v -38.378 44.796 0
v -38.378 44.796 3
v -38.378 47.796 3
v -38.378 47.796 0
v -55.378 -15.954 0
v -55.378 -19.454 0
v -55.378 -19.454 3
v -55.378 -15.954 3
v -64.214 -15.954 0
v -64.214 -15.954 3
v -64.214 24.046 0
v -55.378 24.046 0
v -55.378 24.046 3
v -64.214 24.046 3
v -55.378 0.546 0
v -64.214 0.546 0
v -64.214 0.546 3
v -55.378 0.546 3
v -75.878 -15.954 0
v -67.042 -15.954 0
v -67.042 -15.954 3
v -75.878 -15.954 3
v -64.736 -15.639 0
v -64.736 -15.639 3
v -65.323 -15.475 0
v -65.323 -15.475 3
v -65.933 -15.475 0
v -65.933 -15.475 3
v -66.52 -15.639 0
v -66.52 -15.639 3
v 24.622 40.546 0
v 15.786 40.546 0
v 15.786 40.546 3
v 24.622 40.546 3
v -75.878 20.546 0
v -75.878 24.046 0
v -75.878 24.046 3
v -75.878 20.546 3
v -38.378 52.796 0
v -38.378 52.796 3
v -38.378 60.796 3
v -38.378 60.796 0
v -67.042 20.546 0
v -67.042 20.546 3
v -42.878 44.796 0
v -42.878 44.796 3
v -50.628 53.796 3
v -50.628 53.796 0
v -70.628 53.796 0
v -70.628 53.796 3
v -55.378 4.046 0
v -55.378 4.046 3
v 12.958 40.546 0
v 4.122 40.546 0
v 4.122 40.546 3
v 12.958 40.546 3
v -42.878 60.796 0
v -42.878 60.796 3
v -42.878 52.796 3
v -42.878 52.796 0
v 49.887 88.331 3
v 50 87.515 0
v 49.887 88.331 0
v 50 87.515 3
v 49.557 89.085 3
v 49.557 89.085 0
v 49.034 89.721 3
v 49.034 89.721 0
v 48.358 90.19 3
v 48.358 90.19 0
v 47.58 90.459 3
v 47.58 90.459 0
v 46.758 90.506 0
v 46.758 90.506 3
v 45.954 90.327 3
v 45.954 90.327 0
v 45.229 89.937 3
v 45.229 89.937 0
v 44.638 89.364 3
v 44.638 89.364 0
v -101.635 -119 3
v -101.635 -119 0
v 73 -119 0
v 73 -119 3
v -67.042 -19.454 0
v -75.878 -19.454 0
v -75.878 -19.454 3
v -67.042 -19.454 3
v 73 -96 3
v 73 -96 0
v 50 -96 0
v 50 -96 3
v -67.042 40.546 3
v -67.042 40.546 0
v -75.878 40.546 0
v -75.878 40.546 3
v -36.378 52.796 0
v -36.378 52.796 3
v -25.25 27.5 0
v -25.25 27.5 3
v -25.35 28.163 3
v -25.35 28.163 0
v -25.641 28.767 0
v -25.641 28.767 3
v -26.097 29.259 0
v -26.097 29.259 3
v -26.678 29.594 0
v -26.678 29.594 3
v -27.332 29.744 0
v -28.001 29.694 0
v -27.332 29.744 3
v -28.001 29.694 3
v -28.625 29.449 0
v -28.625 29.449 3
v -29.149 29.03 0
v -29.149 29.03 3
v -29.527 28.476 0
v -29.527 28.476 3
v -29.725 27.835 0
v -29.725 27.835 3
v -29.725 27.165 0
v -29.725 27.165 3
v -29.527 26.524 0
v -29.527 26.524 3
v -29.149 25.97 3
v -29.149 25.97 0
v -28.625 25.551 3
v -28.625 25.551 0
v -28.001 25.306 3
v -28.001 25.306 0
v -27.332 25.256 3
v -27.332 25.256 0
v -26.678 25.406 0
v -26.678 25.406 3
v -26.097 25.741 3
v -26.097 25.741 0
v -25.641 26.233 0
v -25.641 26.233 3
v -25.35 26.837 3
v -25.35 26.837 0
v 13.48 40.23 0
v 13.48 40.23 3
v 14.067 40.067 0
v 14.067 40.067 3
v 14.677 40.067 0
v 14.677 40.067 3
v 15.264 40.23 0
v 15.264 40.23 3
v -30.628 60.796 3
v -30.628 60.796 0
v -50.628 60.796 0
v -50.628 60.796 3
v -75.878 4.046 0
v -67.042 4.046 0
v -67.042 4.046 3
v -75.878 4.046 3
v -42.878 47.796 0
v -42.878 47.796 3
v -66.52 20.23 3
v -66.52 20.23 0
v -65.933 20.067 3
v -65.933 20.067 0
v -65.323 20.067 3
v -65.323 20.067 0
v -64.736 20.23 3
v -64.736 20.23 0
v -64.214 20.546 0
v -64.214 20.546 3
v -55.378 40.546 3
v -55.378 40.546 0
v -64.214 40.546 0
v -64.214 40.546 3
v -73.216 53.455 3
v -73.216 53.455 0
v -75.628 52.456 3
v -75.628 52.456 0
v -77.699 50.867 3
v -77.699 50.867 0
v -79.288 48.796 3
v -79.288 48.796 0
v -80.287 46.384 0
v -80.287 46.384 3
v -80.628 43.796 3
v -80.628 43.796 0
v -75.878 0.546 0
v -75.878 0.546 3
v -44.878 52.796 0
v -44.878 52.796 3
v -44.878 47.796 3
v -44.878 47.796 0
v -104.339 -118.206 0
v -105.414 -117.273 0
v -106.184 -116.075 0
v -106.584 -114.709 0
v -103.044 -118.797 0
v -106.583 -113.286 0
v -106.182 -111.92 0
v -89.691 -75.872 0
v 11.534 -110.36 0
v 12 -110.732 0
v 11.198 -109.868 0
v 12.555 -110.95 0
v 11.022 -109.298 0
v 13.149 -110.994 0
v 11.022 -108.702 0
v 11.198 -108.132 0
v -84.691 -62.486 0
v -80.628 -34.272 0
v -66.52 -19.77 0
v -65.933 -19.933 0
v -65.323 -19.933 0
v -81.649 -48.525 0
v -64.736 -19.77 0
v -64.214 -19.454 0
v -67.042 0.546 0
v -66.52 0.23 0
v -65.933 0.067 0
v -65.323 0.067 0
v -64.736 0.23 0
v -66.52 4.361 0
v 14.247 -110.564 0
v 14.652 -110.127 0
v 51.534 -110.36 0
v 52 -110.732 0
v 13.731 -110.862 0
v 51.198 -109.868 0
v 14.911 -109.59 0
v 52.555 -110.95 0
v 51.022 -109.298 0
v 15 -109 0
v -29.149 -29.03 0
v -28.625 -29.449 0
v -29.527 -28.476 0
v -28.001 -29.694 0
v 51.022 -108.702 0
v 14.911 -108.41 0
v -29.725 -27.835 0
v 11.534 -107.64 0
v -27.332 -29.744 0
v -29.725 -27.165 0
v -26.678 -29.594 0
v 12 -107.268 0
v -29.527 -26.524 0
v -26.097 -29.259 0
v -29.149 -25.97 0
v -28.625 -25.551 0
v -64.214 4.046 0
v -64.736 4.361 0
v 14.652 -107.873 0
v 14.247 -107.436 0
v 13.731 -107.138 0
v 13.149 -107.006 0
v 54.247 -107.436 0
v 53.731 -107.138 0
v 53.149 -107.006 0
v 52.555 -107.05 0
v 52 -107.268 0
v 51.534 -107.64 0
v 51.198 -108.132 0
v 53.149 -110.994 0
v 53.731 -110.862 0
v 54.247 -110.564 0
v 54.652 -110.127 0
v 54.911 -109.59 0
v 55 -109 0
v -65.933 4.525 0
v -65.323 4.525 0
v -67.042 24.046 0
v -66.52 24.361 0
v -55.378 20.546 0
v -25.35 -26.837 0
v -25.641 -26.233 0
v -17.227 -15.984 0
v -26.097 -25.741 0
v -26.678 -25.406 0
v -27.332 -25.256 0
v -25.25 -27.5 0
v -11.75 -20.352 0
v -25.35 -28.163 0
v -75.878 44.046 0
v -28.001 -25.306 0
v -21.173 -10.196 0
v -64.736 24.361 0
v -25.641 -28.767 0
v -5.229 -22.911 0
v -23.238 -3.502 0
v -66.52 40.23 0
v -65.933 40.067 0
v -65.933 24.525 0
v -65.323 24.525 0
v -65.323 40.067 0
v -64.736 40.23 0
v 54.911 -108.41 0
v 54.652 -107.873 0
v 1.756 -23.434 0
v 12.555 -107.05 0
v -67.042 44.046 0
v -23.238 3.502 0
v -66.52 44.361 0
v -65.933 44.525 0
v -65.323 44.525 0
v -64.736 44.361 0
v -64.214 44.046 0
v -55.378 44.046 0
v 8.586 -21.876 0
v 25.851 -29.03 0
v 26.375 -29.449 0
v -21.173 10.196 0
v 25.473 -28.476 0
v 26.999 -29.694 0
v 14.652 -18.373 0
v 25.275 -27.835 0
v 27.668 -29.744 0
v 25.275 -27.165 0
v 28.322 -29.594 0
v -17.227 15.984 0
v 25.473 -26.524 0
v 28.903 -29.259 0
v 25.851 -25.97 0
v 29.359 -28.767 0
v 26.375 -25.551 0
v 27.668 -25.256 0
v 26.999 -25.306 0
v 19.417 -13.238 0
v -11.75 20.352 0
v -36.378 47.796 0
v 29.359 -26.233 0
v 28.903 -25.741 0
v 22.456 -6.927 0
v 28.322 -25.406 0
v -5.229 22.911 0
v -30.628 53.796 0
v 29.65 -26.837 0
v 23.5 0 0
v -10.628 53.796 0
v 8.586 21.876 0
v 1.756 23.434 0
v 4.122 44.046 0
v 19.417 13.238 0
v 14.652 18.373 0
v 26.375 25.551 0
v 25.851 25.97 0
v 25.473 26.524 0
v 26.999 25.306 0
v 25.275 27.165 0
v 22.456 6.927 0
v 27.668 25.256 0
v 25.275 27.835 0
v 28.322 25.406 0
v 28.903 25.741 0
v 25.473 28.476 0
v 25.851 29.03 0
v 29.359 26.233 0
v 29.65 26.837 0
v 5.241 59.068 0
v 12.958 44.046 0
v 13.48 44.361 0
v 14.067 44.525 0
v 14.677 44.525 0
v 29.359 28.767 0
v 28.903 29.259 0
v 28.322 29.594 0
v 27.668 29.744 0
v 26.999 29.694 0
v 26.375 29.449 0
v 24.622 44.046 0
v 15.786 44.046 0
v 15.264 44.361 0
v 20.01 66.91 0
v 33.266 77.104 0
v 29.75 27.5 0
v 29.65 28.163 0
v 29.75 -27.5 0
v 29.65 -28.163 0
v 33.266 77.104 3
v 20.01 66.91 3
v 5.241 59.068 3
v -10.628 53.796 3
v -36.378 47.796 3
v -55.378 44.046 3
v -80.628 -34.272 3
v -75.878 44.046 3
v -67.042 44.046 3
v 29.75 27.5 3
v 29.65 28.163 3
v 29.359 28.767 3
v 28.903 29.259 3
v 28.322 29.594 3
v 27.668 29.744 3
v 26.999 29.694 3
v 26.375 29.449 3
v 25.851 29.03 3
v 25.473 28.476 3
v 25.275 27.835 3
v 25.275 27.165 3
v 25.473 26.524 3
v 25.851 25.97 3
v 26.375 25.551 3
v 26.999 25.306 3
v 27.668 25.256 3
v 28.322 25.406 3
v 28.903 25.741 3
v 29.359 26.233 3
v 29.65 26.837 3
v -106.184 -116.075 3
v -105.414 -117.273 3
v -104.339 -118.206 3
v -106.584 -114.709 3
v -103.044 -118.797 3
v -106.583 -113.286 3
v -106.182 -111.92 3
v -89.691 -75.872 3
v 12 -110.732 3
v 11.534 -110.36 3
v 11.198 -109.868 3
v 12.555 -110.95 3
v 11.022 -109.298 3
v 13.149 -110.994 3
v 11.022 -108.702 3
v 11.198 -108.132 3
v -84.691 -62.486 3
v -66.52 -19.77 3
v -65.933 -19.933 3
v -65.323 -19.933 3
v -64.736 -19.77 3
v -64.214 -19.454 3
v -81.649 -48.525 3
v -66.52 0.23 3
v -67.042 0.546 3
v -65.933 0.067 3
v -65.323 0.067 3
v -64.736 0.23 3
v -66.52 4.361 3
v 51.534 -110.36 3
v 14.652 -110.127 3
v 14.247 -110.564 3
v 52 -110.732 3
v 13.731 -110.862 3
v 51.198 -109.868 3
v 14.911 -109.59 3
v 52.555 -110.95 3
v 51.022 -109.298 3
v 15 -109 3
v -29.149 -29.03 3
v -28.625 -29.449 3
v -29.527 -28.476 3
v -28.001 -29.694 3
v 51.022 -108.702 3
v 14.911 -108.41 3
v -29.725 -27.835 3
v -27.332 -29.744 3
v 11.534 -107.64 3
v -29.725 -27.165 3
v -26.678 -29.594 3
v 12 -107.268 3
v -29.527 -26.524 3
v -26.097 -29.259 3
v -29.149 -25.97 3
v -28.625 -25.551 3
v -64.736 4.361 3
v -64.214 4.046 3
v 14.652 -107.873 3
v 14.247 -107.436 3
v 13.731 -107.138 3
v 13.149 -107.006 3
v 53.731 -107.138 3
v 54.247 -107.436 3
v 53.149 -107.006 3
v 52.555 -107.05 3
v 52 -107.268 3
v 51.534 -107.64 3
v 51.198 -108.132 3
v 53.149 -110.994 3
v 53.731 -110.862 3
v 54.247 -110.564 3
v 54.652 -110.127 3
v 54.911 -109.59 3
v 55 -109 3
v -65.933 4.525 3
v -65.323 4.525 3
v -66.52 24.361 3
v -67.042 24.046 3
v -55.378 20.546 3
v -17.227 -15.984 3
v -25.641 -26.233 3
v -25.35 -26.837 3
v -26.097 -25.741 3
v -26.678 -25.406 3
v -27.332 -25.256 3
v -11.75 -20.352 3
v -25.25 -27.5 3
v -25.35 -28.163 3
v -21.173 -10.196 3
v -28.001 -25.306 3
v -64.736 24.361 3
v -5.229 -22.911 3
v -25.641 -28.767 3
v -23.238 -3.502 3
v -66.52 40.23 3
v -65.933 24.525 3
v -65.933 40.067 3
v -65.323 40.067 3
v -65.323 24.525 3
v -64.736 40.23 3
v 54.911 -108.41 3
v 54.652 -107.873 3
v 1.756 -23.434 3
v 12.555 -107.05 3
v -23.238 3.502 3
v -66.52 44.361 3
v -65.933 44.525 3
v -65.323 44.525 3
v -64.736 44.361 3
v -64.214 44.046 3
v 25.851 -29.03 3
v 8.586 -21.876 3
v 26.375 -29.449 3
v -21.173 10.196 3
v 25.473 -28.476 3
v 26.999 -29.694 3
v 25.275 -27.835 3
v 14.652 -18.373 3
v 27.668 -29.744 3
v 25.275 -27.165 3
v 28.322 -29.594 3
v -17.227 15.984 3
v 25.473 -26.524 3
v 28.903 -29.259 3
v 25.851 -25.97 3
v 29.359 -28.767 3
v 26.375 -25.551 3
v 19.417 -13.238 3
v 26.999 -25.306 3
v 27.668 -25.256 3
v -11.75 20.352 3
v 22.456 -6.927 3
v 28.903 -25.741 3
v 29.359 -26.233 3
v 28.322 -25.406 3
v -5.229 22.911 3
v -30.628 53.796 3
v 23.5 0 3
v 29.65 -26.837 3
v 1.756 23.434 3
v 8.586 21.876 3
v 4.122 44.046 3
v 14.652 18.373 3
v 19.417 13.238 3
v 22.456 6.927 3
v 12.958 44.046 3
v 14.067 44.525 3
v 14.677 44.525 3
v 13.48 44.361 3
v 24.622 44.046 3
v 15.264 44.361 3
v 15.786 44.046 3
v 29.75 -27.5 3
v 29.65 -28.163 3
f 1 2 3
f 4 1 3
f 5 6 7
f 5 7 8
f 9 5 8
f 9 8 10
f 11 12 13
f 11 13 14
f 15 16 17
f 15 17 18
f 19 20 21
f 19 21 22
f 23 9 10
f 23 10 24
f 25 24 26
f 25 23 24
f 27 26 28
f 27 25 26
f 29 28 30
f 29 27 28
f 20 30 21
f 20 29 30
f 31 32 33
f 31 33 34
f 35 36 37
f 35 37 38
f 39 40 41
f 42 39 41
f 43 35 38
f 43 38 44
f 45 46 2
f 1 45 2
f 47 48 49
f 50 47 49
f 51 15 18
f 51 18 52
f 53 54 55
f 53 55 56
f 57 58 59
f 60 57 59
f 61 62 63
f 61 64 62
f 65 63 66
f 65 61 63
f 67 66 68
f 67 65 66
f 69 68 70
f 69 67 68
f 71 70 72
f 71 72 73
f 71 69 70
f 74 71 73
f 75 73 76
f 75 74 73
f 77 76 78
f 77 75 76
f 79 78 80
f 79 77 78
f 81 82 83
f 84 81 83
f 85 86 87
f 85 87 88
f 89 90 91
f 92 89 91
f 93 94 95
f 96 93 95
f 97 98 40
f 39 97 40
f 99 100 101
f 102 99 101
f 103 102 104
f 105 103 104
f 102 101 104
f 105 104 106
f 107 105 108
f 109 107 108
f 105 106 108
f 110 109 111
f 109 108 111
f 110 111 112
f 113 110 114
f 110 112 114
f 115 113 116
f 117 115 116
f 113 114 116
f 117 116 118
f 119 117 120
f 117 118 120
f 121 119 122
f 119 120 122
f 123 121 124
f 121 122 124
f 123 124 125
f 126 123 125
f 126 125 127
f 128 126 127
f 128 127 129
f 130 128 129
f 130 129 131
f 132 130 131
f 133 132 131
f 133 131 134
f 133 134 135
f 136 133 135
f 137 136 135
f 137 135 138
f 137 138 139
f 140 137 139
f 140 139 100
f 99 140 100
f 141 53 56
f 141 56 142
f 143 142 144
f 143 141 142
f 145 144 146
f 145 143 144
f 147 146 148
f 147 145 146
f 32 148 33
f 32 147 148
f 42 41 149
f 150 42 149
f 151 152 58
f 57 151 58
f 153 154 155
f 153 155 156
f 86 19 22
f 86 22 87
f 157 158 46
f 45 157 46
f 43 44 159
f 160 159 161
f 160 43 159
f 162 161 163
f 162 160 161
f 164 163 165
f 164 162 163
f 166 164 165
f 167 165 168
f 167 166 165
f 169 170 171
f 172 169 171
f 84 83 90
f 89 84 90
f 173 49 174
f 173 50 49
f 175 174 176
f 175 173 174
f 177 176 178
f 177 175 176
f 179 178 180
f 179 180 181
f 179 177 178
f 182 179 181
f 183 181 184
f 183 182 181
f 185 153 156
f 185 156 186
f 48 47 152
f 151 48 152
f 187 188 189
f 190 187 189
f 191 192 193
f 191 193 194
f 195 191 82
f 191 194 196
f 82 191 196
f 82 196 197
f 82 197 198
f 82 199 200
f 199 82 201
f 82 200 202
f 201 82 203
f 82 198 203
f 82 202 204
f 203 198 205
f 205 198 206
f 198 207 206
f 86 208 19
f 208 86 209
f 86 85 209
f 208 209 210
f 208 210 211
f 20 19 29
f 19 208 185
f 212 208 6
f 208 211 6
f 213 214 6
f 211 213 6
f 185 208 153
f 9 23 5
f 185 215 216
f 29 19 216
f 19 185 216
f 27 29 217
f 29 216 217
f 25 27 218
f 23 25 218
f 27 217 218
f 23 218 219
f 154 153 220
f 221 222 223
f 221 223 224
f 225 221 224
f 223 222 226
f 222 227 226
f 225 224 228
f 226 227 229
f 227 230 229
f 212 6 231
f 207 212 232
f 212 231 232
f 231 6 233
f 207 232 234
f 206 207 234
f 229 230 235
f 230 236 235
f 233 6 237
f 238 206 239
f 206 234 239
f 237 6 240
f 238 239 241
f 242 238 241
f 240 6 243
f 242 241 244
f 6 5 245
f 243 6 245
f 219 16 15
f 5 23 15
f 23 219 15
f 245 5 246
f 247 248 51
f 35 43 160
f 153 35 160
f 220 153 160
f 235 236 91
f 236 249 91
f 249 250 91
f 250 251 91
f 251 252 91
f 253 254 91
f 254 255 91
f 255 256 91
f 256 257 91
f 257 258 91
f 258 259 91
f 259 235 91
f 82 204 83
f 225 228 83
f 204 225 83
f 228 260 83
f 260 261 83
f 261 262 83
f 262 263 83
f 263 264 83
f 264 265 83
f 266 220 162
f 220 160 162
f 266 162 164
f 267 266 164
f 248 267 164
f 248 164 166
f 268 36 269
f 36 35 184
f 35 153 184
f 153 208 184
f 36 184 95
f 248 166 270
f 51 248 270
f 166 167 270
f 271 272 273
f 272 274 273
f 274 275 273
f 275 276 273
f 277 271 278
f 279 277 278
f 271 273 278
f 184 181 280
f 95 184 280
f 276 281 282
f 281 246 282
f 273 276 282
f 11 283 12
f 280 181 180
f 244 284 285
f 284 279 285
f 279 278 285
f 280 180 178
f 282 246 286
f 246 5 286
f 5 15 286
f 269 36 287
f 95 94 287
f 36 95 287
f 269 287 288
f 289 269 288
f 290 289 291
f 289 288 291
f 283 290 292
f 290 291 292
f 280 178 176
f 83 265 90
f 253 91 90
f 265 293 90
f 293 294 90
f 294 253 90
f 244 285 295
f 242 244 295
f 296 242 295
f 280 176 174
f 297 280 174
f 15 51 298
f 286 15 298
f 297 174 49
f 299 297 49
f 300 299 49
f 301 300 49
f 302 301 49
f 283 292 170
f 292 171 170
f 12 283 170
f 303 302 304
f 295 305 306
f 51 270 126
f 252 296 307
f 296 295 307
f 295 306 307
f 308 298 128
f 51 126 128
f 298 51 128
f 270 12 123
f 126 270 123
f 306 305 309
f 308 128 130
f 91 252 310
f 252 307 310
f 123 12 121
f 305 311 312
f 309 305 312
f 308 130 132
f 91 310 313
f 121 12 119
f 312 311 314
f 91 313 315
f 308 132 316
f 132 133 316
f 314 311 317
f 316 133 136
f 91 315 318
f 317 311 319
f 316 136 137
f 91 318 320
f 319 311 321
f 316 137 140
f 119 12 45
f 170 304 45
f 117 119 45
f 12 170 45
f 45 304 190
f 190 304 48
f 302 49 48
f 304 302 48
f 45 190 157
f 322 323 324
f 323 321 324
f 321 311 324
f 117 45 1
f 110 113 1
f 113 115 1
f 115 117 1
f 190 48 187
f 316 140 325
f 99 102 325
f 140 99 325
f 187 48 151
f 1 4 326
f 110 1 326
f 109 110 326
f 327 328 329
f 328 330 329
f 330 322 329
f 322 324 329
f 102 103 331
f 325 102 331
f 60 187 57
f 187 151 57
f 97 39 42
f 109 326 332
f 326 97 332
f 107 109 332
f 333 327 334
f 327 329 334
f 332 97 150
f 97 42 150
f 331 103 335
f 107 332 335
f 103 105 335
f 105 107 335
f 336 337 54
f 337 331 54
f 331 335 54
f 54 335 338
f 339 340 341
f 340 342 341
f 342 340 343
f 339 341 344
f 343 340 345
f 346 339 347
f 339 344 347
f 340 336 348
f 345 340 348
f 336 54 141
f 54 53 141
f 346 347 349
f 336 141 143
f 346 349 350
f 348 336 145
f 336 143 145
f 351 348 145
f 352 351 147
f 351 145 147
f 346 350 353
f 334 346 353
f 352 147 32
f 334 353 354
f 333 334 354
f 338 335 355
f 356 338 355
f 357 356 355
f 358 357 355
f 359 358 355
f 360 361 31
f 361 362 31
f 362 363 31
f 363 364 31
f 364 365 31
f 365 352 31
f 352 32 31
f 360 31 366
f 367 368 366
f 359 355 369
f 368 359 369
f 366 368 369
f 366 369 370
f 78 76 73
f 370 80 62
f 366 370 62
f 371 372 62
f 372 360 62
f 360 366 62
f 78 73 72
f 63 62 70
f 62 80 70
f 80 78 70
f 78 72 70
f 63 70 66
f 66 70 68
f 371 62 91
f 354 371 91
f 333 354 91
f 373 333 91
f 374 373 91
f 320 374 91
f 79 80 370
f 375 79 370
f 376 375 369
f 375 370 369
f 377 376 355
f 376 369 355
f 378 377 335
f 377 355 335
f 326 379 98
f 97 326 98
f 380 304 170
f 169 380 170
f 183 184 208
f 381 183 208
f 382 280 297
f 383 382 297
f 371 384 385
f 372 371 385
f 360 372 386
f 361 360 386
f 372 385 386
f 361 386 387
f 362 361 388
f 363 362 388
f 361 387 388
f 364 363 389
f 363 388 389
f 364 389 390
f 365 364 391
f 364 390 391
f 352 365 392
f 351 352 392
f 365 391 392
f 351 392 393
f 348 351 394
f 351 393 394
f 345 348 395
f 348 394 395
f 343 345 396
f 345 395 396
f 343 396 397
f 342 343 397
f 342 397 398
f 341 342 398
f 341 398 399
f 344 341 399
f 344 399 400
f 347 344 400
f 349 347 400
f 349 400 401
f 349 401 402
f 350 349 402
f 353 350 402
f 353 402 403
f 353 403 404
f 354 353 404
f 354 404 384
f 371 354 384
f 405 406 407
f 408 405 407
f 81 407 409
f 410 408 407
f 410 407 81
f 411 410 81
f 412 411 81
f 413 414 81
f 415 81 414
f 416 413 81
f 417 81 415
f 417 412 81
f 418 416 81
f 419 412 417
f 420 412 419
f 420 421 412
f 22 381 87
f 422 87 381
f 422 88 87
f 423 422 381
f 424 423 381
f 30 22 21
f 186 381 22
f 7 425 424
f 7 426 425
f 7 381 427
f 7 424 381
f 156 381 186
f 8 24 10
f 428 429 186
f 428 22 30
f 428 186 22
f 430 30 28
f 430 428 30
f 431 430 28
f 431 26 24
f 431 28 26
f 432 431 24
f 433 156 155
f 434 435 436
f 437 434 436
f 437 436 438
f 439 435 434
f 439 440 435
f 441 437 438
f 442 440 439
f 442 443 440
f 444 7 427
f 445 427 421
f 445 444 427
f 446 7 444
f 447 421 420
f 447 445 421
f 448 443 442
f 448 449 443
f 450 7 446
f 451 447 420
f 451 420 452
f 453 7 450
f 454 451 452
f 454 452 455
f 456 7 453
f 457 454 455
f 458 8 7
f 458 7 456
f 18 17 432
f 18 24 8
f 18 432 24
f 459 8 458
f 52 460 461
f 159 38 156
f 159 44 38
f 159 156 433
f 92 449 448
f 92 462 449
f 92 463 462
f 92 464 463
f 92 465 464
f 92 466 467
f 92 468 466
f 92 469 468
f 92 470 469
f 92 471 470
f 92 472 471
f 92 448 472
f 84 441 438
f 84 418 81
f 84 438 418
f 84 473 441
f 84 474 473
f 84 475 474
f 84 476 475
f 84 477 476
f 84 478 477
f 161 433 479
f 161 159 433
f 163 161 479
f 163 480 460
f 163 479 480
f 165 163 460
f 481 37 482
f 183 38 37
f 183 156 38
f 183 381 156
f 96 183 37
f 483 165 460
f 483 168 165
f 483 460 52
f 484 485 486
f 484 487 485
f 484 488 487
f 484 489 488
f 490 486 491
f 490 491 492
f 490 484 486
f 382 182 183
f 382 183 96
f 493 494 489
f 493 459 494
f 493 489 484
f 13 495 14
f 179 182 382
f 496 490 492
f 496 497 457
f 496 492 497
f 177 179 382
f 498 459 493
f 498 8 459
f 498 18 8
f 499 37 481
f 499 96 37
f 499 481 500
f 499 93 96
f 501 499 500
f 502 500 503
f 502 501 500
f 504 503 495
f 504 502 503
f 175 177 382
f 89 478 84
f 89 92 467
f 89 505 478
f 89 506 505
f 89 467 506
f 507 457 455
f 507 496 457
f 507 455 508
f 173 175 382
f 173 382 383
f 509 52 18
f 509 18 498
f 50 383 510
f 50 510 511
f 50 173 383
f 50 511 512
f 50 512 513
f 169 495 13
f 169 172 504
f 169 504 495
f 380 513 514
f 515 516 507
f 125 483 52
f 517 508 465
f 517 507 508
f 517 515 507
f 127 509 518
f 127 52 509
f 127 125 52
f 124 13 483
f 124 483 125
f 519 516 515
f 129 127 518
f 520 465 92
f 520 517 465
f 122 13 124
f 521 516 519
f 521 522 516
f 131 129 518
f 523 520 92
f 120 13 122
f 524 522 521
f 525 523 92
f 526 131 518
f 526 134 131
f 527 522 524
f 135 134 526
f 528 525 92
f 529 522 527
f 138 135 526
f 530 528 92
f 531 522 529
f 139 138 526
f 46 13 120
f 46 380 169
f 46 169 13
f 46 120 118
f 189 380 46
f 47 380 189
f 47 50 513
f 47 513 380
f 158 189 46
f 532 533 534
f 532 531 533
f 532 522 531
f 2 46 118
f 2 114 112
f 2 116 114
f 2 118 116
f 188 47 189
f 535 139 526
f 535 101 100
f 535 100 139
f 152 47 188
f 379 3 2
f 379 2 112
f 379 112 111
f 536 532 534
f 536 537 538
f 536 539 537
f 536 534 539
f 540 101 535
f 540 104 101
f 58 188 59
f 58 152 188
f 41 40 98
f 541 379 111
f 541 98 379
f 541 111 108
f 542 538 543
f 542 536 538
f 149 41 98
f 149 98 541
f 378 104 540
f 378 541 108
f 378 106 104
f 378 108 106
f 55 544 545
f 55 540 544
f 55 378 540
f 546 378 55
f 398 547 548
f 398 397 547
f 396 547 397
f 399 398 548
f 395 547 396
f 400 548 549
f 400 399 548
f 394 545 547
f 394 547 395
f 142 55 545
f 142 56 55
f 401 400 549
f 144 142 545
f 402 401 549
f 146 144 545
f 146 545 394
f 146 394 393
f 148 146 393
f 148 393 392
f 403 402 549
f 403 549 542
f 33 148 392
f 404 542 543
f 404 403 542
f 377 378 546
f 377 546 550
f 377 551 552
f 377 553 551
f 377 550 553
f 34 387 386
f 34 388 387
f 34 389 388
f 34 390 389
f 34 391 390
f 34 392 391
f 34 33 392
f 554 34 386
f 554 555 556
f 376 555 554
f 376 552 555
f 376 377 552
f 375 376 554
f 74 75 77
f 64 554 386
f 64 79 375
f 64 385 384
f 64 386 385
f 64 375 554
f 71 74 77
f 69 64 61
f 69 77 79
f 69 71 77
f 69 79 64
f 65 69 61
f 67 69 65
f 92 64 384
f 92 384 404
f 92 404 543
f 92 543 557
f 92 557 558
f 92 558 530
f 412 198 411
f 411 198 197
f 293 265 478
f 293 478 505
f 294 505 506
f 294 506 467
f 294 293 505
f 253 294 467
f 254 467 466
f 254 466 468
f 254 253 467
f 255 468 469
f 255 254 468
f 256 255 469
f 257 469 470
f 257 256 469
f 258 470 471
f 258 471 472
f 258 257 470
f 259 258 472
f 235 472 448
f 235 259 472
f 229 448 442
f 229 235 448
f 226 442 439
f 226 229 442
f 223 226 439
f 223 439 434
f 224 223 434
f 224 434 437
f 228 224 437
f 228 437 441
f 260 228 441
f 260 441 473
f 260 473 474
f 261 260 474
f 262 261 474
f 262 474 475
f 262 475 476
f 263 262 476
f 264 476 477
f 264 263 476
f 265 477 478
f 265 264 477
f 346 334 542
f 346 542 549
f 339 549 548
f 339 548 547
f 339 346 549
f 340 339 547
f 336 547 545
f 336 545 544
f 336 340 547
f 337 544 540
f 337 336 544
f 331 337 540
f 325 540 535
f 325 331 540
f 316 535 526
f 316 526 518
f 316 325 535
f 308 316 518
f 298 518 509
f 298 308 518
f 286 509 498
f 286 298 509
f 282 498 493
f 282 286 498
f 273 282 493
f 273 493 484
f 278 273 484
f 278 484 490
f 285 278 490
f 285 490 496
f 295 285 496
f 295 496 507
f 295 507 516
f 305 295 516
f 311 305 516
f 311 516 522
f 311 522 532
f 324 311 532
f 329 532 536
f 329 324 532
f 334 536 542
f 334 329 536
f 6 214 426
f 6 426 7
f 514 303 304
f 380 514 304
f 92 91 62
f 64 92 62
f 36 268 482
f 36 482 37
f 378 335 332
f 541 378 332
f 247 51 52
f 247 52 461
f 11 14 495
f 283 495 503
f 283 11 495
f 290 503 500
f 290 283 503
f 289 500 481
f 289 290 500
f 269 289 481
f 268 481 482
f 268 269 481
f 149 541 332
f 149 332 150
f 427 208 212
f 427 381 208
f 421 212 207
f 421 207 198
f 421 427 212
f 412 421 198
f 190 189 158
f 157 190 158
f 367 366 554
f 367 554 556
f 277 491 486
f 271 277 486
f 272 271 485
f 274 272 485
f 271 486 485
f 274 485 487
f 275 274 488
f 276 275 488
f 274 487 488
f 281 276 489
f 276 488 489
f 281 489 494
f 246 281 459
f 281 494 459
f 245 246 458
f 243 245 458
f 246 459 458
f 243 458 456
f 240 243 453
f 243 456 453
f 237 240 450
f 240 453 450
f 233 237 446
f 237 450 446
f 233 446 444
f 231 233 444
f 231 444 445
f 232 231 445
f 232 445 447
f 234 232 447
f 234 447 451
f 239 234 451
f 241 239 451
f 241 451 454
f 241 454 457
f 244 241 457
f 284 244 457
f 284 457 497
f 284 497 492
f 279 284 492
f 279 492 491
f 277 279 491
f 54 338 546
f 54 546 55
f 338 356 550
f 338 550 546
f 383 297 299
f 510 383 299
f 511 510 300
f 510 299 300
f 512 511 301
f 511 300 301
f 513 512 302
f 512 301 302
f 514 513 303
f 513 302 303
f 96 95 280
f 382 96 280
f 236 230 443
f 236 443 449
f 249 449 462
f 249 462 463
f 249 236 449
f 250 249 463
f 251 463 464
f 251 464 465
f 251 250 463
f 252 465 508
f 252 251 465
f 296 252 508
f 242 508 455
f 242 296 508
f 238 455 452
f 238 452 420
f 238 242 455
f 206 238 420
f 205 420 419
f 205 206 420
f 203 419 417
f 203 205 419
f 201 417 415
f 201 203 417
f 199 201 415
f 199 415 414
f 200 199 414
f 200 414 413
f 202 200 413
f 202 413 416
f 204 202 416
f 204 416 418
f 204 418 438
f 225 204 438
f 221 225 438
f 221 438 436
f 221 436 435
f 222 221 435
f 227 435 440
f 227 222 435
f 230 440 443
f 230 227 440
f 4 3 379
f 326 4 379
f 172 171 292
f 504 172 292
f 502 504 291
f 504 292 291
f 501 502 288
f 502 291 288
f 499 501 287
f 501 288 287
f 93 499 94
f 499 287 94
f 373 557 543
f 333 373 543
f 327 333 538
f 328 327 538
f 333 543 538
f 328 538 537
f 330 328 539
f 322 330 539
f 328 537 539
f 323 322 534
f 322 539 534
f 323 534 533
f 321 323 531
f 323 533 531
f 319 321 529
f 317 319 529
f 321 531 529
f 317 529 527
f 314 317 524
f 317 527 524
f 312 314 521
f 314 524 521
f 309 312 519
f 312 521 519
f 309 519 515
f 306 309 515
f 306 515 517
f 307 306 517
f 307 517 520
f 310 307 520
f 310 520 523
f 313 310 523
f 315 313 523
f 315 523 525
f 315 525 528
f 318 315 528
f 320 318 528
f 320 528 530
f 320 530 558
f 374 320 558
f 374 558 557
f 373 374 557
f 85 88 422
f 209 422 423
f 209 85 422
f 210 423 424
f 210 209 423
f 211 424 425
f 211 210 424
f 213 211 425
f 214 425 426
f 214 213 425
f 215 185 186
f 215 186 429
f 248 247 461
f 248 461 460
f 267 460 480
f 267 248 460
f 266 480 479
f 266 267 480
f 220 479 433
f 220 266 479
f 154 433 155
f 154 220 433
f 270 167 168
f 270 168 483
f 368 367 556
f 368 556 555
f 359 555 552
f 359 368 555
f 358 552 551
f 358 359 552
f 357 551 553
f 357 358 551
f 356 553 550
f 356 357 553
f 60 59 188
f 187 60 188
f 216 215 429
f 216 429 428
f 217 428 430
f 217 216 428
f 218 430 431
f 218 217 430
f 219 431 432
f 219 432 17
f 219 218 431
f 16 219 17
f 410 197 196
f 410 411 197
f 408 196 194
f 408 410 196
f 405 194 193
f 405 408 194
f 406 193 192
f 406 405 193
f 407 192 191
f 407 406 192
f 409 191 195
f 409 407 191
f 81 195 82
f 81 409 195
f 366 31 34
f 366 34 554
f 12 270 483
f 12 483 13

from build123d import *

# Parameters (mm, degrees)
SKETCH_1_R          = 2
SKETCH_1_R_2        = 23.5
EXTRUDE_1_DEPTH     = 3
SKETCH_2_R          = 2.25
CUT_EXTRUDE_1_DEPTH = 162.687369417
FILLET_1_R          = 10
FILLET_2_R          = 100
FILLET_3_R          = 5
SKETCH_3_W          = 20
SKETCH_3_H          = 7
EXTRUDE_2_DEPTH     = 3
CUT_EXTRUDE_2_DEPTH = 10
FILLET_4_R          = 3
CUT_EXTRUDE_3_DEPTH = 3
CUT_EXTRUDE_START   = -10
CUT_EXTRUDE_4_DEPTH = 10


with BuildPart() as part:
    # 草图1 → 凸台-拉伸1 (new body)
    # profile 1 of 3: a face of its own
    with BuildSketch(Plane.XY):
        with BuildLine():
            Line((-80.627893842, 53.795936885), (-80.627893842, -56.059432026))
            Line((-80.627893842, -56.059432026), (-109.420315431, -119))
            Line((-109.420315431, -119), (50, -119))
            Line((50, -119), (73, -119))
            Line((73, -119), (73, -96))
            Line((73, -96), (50, -96))
            Line((50, -96), (50, 0))
            ThreePointArc((50, 0), (-22.925467429, -44.434479216), (-28.976917727, 40.747248239))
            Line((-28.976917727, 40.747248239), (-10.627893842, 53.795936885))
            Line((-10.627893842, 53.795936885), (-80.627893842, 53.795936885))
        make_face()
        with BuildLine():
            Line((-66.950769498, -19.204063115), (-75.627893842, -19.204063115))
            Line((-75.627893842, -19.204063115), (-75.627893842, -16.204063115))
            Line((-75.627893842, -16.204063115), (-66.950769498, -16.204063115))
            ThreePointArc((-66.950769498, -16.204063115), (-65.627893842, -15.704063115), (-64.305018187, -16.204063115))
            Line((-64.305018187, -16.204063115), (-55.627893842, -16.204063115))
            Line((-55.627893842, -16.204063115), (-55.627893842, -19.204063115))
            Line((-55.627893842, -19.204063115), (-64.305018187, -19.204063115))
            ThreePointArc((-64.305018187, -19.204063115), (-65.627893842, -19.704063115), (-66.950769498, -19.204063115))
        make_face(mode=Mode.SUBTRACT)
        with Locations((13, -109)):
            Circle(SKETCH_1_R, mode=Mode.SUBTRACT)
        with Locations((53, -109.000000002)):
            Circle(SKETCH_1_R, mode=Mode.SUBTRACT)
        with BuildLine():
            Line((-66.950769498, 0.795936885), (-75.627893842, 0.795936885))
            Line((-75.627893842, 0.795936885), (-75.627893842, 3.795936885))
            Line((-75.627893842, 3.795936885), (-66.950769498, 3.795936885))
            ThreePointArc((-66.950769498, 3.795936885), (-65.627893842, 4.295936885), (-64.305018187, 3.795936885))
            Line((-64.305018187, 3.795936885), (-55.627893842, 3.795936885))
            Line((-55.627893842, 3.795936885), (-55.627893842, 0.795936885))
            Line((-55.627893842, 0.795936885), (-64.305018187, 0.795936885))
            ThreePointArc((-64.305018187, 0.795936885), (-65.627893842, 0.295936885), (-66.950769498, 0.795936885))
        make_face(mode=Mode.SUBTRACT)
        with BuildLine():
            Line((-66.950769498, 20.795936885), (-75.627893842, 20.795936885))
            Line((-75.627893842, 20.795936885), (-75.627893842, 23.795936885))
            Line((-75.627893842, 23.795936885), (-66.950769498, 23.795936885))
            ThreePointArc((-66.950769498, 23.795936885), (-65.627893842, 24.295936885), (-64.305018187, 23.795936885))
            Line((-64.305018187, 23.795936885), (-55.627893842, 23.795936885))
            Line((-55.627893842, 23.795936885), (-55.627893842, 20.795936885))
            Line((-55.627893842, 20.795936885), (-64.305018187, 20.795936885))
            ThreePointArc((-64.305018187, 20.795936885), (-65.627893842, 20.295936885), (-66.950769498, 20.795936885))
        make_face(mode=Mode.SUBTRACT)
        with BuildLine():
            Line((-55.627893842, 40.795936885), (-64.305018187, 40.795936885))
            ThreePointArc((-64.305018187, 40.795936885), (-65.627893842, 40.295936885), (-66.950769498, 40.795936885))
            Line((-66.950769498, 40.795936885), (-75.627893842, 40.795936885))
            Line((-75.627893842, 40.795936885), (-75.627893842, 43.795936885))
            Line((-75.627893842, 43.795936885), (-66.950769498, 43.795936885))
            ThreePointArc((-66.950769498, 43.795936885), (-65.627893842, 44.295936885), (-64.305018187, 43.795936885))
            Line((-64.305018187, 43.795936885), (-55.627893842, 43.795936885))
            Line((-55.627893842, 43.795936885), (-55.627893842, 40.795936885))
        make_face(mode=Mode.SUBTRACT)
    # profile 2 of 3: a face of its own
    with BuildSketch(Plane.XY):
        with BuildLine():
            ThreePointArc((50, 96.910737705), (23.844670052, 69.505503521), (-10.627893842, 53.795936885))
            Line((-10.627893842, 53.795936885), (-28.976917727, 40.747248239))
            ThreePointArc((-28.976917727, 40.747248239), (22.925467429, 44.434479216), (50, 0))
            Line((50, 0), (50, 96.910737705))
        make_face()
    # profile 3 of 3: a face of its own
    with BuildSketch(Plane.XY):
        with BuildLine():
            ThreePointArc((50, 0), (22.925467429, 44.434479216), (-28.976917727, 40.747248239))
            ThreePointArc((-28.976917727, 40.747248239), (-22.925467429, -44.434479216), (50, 0))
        make_face()
        Circle(SKETCH_1_R_2, mode=Mode.SUBTRACT)
    extrude(amount=EXTRUDE_1_DEPTH)

    # 草图2 → 切除-拉伸1 (cut, through all)
    with BuildSketch(Plane.XY.offset(3)):
        with Locations((-27.5, 27.5)):
            Circle(SKETCH_2_R)
        with Locations((27.5, 27.5)):
            Circle(SKETCH_2_R)
        with Locations((27.5, -27.5)):
            Circle(SKETCH_2_R)
        with Locations((-27.5, -27.5)):
            Circle(SKETCH_2_R)
    extrude(amount=-CUT_EXTRUDE_1_DEPTH, mode=Mode.SUBTRACT)

    # 圆角1
    fillet_1_edges = [part.edges().sort_by_distance(p)[0] for p in [
        (-80.627893842, 53.795936885, 1.5),
    ]]
    fillet(fillet_1_edges, radius=FILLET_1_R)

    # 圆角2
    fillet_2_edges = [part.edges().sort_by_distance(p)[0] for p in [
        (-80.627893842, -56.059432026, 1.5),
    ]]
    fillet(fillet_2_edges, radius=FILLET_2_R)

    # 圆角3
    fillet_3_edges = [part.edges().sort_by_distance(p)[0] for p in [
        (-109.420315431, -119, 1.5),
    ]]
    fillet(fillet_3_edges, radius=FILLET_3_R)

    # 草图3 → 凸台-拉伸2 (add)
    with BuildSketch(Plane.XY.offset(3)):
        with Locations((-40.627893842, 57.295936885)):
            Rectangle(SKETCH_3_W, SKETCH_3_H)
    extrude(amount=-EXTRUDE_2_DEPTH)

    # 草图4 → 切除-拉伸2 (cut)
    with BuildSketch(Plane.XY.offset(3)):
        with BuildLine():
            Line((15.694981813, 43.795936885), (13.049230502, 43.795936885))
            ThreePointArc((13.049230502, 43.795936885), (12.372106158, 42.295936885), (13.049230502, 40.795936885))
            Line((13.049230502, 40.795936885), (15.694981813, 40.795936885))
            ThreePointArc((15.694981813, 40.795936885), (16.194981813, 41.47306123), (16.372106158, 42.295936885))
            ThreePointArc((16.372106158, 42.295936885), (16.194981813, 43.118812541), (15.694981813, 43.795936885))
        make_face()
        with BuildLine():
            ThreePointArc((15.694981813, 43.795936885), (14.372106158, 44.295936885), (13.049230502, 43.795936885))
            Line((13.049230502, 43.795936885), (15.694981813, 43.795936885))
        make_face()
        with BuildLine():
            Line((15.694981813, 40.795936885), (13.049230502, 40.795936885))
            ThreePointArc((13.049230502, 40.795936885), (14.372106158, 40.295936885), (15.694981813, 40.795936885))
        make_face()
        with BuildLine():
            Line((24.372106158, 43.795936885), (15.694981813, 43.795936885))
            ThreePointArc((15.694981813, 43.795936885), (16.194981813, 43.118812541), (16.372106158, 42.295936885))
            ThreePointArc((16.372106158, 42.295936885), (16.194981813, 41.47306123), (15.694981813, 40.795936885))
            Line((15.694981813, 40.795936885), (24.372106158, 40.795936885))
            Line((24.372106158, 40.795936885), (24.372106158, 43.795936885))
        make_face()
        with BuildLine():
            Line((13.049230502, 43.795936885), (4.372106158, 43.795936885))
            Line((4.372106158, 43.795936885), (4.372106158, 40.795936885))
            Line((4.372106158, 40.795936885), (13.049230502, 40.795936885))
            ThreePointArc((13.049230502, 40.795936885), (12.372106158, 42.295936885), (13.049230502, 43.795936885))
        make_face()
    extrude(amount=-CUT_EXTRUDE_2_DEPTH, mode=Mode.SUBTRACT)

    # 圆角4
    fillet_4_edges = [part.edges().sort_by_distance(p)[0] for p in [
        (50, 96.910737705, 1.5),
    ]]
    fillet(fillet_4_edges, radius=FILLET_4_R)

    # 草图5 → 切除-拉伸3 (cut)
    with BuildSketch(Plane.XY.offset(3)):
        Polygon((-42.877893842, 60.795936885), (-42.877893842, 52.795936885), (-44.877893842, 52.795936885), (-44.877893842, 47.795936885), (-42.877893842, 47.795936885), (-42.877893842, 44.795936885), (-38.377893842, 44.795936885), (-38.377893842, 47.795936885), (-36.377893842, 47.795936885), (-36.377893842, 52.795936885), (-38.377893842, 52.795936885), (-38.377893842, 60.795936885), align=None)
    extrude(amount=-CUT_EXTRUDE_3_DEPTH, mode=Mode.SUBTRACT)

    # 草图7 → 切除-拉伸4 (cut)
    # profile 1 of 5: a face of its own
    with BuildSketch(Plane.XY.offset(3).offset(CUT_EXTRUDE_START)):
        with BuildLine():
            Line((-75.877893842, 44.045936885), (-67.042107404, 44.045936885))
            ThreePointArc((-67.042107404, 44.045936885), (-65.627893842, 44.545936885), (-64.21368028, 44.045936885))
            Line((-64.21368028, 44.045936885), (-55.377893842, 44.045936885))
            Line((-55.377893842, 44.045936885), (-55.377893842, 40.545936885))
            Line((-55.377893842, 40.545936885), (-64.21368028, 40.545936885))
            ThreePointArc((-64.21368028, 40.545936885), (-65.627893842, 40.045936885), (-67.042107404, 40.545936885))
            Line((-67.042107404, 40.545936885), (-75.877893842, 40.545936885))
            Line((-75.877893842, 40.545936885), (-75.877893842, 44.045936885))
        make_face()
        with BuildLine():
            Line((-64.305018187, 43.795936885), (-55.627893842, 43.795936885))
            Line((-55.627893842, 43.795936885), (-55.627893842, 40.795936885))
            Line((-55.627893842, 40.795936885), (-64.305018187, 40.795936885))
            ThreePointArc((-64.305018187, 40.795936885), (-65.627893842, 40.295936885), (-66.950769498, 40.795936885))
            Line((-66.950769498, 40.795936885), (-75.627893842, 40.795936885))
            Line((-75.627893842, 40.795936885), (-75.627893842, 43.795936885))
            Line((-75.627893842, 43.795936885), (-66.950769498, 43.795936885))
            ThreePointArc((-66.950769498, 43.795936885), (-65.627893842, 44.295936885), (-64.305018187, 43.795936885))
        make_face(mode=Mode.SUBTRACT)
    # profile 2 of 5: a face of its own
    with BuildSketch(Plane.XY.offset(3).offset(CUT_EXTRUDE_START)):
        with BuildLine():
            Line((-75.877893842, 24.045936885), (-75.877893842, 20.545936885))
            Line((-75.877893842, 20.545936885), (-67.042107404, 20.545936885))
            ThreePointArc((-67.042107404, 20.545936885), (-65.627893842, 20.045936885), (-64.21368028, 20.545936885))
            Line((-64.21368028, 20.545936885), (-55.377893842, 20.545936885))
            Line((-55.377893842, 20.545936885), (-55.377893842, 24.045936885))
            Line((-55.377893842, 24.045936885), (-64.21368028, 24.045936885))
            ThreePointArc((-64.21368028, 24.045936885), (-65.627893842, 24.545936885), (-67.042107404, 24.045936885))
            Line((-67.042107404, 24.045936885), (-75.877893842, 24.045936885))
        make_face()
        with BuildLine():
            Line((-75.627893842, 23.795936885), (-75.627893842, 20.795936885))
            Line((-75.627893842, 20.795936885), (-66.950769498, 20.795936885))
            ThreePointArc((-66.950769498, 20.795936885), (-65.627893842, 20.295936885), (-64.305018187, 20.795936885))
            Line((-64.305018187, 20.795936885), (-55.627893842, 20.795936885))
            Line((-55.627893842, 20.795936885), (-55.627893842, 23.795936885))
            Line((-55.627893842, 23.795936885), (-64.305018187, 23.795936885))
            ThreePointArc((-64.305018187, 23.795936885), (-65.627893842, 24.295936885), (-66.950769498, 23.795936885))
            Line((-66.950769498, 23.795936885), (-75.627893842, 23.795936885))
        make_face(mode=Mode.SUBTRACT)
    # profile 3 of 5: a face of its own
    with BuildSketch(Plane.XY.offset(3).offset(CUT_EXTRUDE_START)):
        with BuildLine():
            Line((-75.877893842, 4.045936885), (-75.877893842, 0.545936885))
            Line((-75.877893842, 0.545936885), (-67.042107404, 0.545936885))
            ThreePointArc((-67.042107404, 0.545936885), (-65.627893842, 0.045936885), (-64.21368028, 0.545936885))
            Line((-64.21368028, 0.545936885), (-55.377893842, 0.545936885))
            Line((-55.377893842, 0.545936885), (-55.377893842, 4.045936885))
            Line((-55.377893842, 4.045936885), (-64.21368028, 4.045936885))
            ThreePointArc((-64.21368028, 4.045936885), (-65.627893842, 4.545936885), (-67.042107404, 4.045936885))
            Line((-67.042107404, 4.045936885), (-75.877893842, 4.045936885))
        make_face()
        with BuildLine():
            Line((-75.627893842, 3.795936885), (-75.627893842, 0.795936885))
            Line((-75.627893842, 0.795936885), (-66.950769498, 0.795936885))
            ThreePointArc((-66.950769498, 0.795936885), (-65.627893842, 0.295936885), (-64.305018187, 0.795936885))
            Line((-64.305018187, 0.795936885), (-55.627893842, 0.795936885))
            Line((-55.627893842, 0.795936885), (-55.627893842, 3.795936885))
            Line((-55.627893842, 3.795936885), (-64.305018187, 3.795936885))
            ThreePointArc((-64.305018187, 3.795936885), (-65.627893842, 4.295936885), (-66.950769498, 3.795936885))
            Line((-66.950769498, 3.795936885), (-75.627893842, 3.795936885))
        make_face(mode=Mode.SUBTRACT)
    # profile 4 of 5: a face of its own
    with BuildSketch(Plane.XY.offset(3).offset(CUT_EXTRUDE_START)):
        with BuildLine():
            Line((-75.877893842, -19.454063115), (-67.042107404, -19.454063115))
            ThreePointArc((-67.042107404, -19.454063115), (-65.627893842, -19.954063115), (-64.21368028, -19.454063115))
            Line((-64.21368028, -19.454063115), (-55.377893842, -19.454063115))
            Line((-55.377893842, -19.454063115), (-55.377893842, -15.954063115))
            Line((-55.377893842, -15.954063115), (-64.21368028, -15.954063115))
            ThreePointArc((-64.21368028, -15.954063115), (-65.627893842, -15.454063115), (-67.042107404, -15.954063115))
            Line((-67.042107404, -15.954063115), (-75.877893842, -15.954063115))
            Line((-75.877893842, -15.954063115), (-75.877893842, -19.454063115))
        make_face()
        with BuildLine():
            Line((-75.627893842, -19.204063115), (-66.950769498, -19.204063115))
            ThreePointArc((-66.950769498, -19.204063115), (-65.627893842, -19.704063115), (-64.305018187, -19.204063115))
            Line((-64.305018187, -19.204063115), (-55.627893842, -19.204063115))
            Line((-55.627893842, -19.204063115), (-55.627893842, -16.204063115))
            Line((-55.627893842, -16.204063115), (-64.305018187, -16.204063115))
            ThreePointArc((-64.305018187, -16.204063115), (-65.627893842, -15.704063115), (-66.950769498, -16.204063115))
            Line((-66.950769498, -16.204063115), (-75.627893842, -16.204063115))
            Line((-75.627893842, -16.204063115), (-75.627893842, -19.204063115))
        make_face(mode=Mode.SUBTRACT)
    # profile 5 of 5: a face of its own
    with BuildSketch(Plane.XY.offset(3).offset(CUT_EXTRUDE_START)):
        with BuildLine():
            Line((4.122106158, 44.045936885), (4.122106158, 40.545936885))
            Line((4.122106158, 40.545936885), (12.957892596, 40.545936885))
            ThreePointArc((12.957892596, 40.545936885), (14.372106158, 40.045936885), (15.78631972, 40.545936885))
            Line((15.78631972, 40.545936885), (24.622106158, 40.545936885))
            Line((24.622106158, 40.545936885), (24.622106158, 44.045936885))
            Line((24.622106158, 44.045936885), (15.78631972, 44.045936885))
            ThreePointArc((15.78631972, 44.045936885), (14.372106158, 44.545936885), (12.957892596, 44.045936885))
            Line((12.957892596, 44.045936885), (4.122106158, 44.045936885))
        make_face()
        with BuildLine():
            Line((4.372106158, 43.795936885), (4.372106158, 40.795936885))
            Line((4.372106158, 40.795936885), (13.049230502, 40.795936885))
            ThreePointArc((13.049230502, 40.795936885), (14.372106158, 40.295936885), (15.694981813, 40.795936885))
            Line((15.694981813, 40.795936885), (24.372106158, 40.795936885))
            Line((24.372106158, 40.795936885), (24.372106158, 43.795936885))
            Line((24.372106158, 43.795936885), (15.694981813, 43.795936885))
            ThreePointArc((15.694981813, 43.795936885), (14.372106158, 44.295936885), (13.049230502, 43.795936885))
            Line((13.049230502, 43.795936885), (4.372106158, 43.795936885))
        make_face(mode=Mode.SUBTRACT)
    extrude(amount=CUT_EXTRUDE_4_DEPTH, mode=Mode.SUBTRACT)


solid = part.part
